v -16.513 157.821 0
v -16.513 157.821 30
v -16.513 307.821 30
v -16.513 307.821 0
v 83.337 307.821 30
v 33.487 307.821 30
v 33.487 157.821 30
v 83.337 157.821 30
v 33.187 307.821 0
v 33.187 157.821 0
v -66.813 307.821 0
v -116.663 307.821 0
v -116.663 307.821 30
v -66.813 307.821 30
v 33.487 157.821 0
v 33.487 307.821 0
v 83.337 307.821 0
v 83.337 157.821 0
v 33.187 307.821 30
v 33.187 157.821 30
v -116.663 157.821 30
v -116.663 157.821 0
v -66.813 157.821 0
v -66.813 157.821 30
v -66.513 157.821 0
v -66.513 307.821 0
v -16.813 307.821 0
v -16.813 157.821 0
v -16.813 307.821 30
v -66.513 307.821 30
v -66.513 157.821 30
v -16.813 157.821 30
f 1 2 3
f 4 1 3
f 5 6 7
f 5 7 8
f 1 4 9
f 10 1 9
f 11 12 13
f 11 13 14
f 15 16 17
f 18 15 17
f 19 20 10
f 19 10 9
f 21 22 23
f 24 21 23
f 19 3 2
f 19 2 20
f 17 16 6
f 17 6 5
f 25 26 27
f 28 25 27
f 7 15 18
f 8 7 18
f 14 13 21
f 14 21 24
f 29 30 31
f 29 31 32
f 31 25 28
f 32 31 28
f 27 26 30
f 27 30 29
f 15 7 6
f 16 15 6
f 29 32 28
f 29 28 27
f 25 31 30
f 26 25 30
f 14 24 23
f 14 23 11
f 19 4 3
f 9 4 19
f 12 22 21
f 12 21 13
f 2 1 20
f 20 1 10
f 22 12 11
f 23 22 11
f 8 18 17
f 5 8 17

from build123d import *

# Parameters (mm, degrees)
SKETCH1_W           = 200
SKETCH1_H           = 150
BOSS_EXTRUDE1_DEPTH = 30
SKETCH2_W           = 0.3
SKETCH2_H           = 150
CUT_EXTRUDE1_DEPTH  = 331.551344976


with BuildPart() as part:
    # Sketch1 → Boss-Extrude1 (new body)
    with BuildSketch(Plane.XY):
        with Locations((-16.662906366, 232.821308462)):
            Rectangle(SKETCH1_W, SKETCH1_H)
    extrude(amount=BOSS_EXTRUDE1_DEPTH)

    # Sketch2 → Cut-Extrude1 (cut, through all)
    with BuildSketch(Plane.XY.offset(30)):
        with Locations((-66.662906366, 232.821308462)):
            Rectangle(SKETCH2_W, SKETCH2_H)
        with Locations((-16.662906366, 232.821308462)):
            Rectangle(SKETCH2_W, SKETCH2_H)
        with Locations((33.337093634, 232.821308462)):
            Rectangle(SKETCH2_W, SKETCH2_H)
    extrude(amount=-CUT_EXTRUDE1_DEPTH, mode=Mode.SUBTRACT)


with BuildPart() as cut_extrude1_piece_1:
    # of the separate pieces the step leaves, piece 1, a body of its own (cut_extrude1_pieces)
    add(part.part.solids().sort_by_distance((-66.812906366, 157.821308462, 0))[0])


with BuildPart() as cut_extrude1_piece_2:
    # of the separate pieces the step leaves, piece 2, a body of its own (cut_extrude1_pieces)
    add(part.part.solids().sort_by_distance((83.337093634, 157.821308462, 0))[0])


with BuildPart() as cut_extrude1_piece_3:
    # of the separate pieces the step leaves, piece 3, a body of its own (cut_extrude1_pieces)
    add(part.part.solids().sort_by_distance((-16.812906366, 157.821308462, 0))[0])


with BuildPart() as cut_extrude1_piece_4:
    # of the separate pieces the step leaves, piece 4, a body of its own (cut_extrude1_pieces)
    add(part.part.solids().sort_by_distance((33.187093634, 157.821308462, 0))[0])


solid = Compound([cut_extrude1_piece_1.part, cut_extrude1_piece_2.part, cut_extrude1_piece_3.part, cut_extrude1_piece_4.part])
